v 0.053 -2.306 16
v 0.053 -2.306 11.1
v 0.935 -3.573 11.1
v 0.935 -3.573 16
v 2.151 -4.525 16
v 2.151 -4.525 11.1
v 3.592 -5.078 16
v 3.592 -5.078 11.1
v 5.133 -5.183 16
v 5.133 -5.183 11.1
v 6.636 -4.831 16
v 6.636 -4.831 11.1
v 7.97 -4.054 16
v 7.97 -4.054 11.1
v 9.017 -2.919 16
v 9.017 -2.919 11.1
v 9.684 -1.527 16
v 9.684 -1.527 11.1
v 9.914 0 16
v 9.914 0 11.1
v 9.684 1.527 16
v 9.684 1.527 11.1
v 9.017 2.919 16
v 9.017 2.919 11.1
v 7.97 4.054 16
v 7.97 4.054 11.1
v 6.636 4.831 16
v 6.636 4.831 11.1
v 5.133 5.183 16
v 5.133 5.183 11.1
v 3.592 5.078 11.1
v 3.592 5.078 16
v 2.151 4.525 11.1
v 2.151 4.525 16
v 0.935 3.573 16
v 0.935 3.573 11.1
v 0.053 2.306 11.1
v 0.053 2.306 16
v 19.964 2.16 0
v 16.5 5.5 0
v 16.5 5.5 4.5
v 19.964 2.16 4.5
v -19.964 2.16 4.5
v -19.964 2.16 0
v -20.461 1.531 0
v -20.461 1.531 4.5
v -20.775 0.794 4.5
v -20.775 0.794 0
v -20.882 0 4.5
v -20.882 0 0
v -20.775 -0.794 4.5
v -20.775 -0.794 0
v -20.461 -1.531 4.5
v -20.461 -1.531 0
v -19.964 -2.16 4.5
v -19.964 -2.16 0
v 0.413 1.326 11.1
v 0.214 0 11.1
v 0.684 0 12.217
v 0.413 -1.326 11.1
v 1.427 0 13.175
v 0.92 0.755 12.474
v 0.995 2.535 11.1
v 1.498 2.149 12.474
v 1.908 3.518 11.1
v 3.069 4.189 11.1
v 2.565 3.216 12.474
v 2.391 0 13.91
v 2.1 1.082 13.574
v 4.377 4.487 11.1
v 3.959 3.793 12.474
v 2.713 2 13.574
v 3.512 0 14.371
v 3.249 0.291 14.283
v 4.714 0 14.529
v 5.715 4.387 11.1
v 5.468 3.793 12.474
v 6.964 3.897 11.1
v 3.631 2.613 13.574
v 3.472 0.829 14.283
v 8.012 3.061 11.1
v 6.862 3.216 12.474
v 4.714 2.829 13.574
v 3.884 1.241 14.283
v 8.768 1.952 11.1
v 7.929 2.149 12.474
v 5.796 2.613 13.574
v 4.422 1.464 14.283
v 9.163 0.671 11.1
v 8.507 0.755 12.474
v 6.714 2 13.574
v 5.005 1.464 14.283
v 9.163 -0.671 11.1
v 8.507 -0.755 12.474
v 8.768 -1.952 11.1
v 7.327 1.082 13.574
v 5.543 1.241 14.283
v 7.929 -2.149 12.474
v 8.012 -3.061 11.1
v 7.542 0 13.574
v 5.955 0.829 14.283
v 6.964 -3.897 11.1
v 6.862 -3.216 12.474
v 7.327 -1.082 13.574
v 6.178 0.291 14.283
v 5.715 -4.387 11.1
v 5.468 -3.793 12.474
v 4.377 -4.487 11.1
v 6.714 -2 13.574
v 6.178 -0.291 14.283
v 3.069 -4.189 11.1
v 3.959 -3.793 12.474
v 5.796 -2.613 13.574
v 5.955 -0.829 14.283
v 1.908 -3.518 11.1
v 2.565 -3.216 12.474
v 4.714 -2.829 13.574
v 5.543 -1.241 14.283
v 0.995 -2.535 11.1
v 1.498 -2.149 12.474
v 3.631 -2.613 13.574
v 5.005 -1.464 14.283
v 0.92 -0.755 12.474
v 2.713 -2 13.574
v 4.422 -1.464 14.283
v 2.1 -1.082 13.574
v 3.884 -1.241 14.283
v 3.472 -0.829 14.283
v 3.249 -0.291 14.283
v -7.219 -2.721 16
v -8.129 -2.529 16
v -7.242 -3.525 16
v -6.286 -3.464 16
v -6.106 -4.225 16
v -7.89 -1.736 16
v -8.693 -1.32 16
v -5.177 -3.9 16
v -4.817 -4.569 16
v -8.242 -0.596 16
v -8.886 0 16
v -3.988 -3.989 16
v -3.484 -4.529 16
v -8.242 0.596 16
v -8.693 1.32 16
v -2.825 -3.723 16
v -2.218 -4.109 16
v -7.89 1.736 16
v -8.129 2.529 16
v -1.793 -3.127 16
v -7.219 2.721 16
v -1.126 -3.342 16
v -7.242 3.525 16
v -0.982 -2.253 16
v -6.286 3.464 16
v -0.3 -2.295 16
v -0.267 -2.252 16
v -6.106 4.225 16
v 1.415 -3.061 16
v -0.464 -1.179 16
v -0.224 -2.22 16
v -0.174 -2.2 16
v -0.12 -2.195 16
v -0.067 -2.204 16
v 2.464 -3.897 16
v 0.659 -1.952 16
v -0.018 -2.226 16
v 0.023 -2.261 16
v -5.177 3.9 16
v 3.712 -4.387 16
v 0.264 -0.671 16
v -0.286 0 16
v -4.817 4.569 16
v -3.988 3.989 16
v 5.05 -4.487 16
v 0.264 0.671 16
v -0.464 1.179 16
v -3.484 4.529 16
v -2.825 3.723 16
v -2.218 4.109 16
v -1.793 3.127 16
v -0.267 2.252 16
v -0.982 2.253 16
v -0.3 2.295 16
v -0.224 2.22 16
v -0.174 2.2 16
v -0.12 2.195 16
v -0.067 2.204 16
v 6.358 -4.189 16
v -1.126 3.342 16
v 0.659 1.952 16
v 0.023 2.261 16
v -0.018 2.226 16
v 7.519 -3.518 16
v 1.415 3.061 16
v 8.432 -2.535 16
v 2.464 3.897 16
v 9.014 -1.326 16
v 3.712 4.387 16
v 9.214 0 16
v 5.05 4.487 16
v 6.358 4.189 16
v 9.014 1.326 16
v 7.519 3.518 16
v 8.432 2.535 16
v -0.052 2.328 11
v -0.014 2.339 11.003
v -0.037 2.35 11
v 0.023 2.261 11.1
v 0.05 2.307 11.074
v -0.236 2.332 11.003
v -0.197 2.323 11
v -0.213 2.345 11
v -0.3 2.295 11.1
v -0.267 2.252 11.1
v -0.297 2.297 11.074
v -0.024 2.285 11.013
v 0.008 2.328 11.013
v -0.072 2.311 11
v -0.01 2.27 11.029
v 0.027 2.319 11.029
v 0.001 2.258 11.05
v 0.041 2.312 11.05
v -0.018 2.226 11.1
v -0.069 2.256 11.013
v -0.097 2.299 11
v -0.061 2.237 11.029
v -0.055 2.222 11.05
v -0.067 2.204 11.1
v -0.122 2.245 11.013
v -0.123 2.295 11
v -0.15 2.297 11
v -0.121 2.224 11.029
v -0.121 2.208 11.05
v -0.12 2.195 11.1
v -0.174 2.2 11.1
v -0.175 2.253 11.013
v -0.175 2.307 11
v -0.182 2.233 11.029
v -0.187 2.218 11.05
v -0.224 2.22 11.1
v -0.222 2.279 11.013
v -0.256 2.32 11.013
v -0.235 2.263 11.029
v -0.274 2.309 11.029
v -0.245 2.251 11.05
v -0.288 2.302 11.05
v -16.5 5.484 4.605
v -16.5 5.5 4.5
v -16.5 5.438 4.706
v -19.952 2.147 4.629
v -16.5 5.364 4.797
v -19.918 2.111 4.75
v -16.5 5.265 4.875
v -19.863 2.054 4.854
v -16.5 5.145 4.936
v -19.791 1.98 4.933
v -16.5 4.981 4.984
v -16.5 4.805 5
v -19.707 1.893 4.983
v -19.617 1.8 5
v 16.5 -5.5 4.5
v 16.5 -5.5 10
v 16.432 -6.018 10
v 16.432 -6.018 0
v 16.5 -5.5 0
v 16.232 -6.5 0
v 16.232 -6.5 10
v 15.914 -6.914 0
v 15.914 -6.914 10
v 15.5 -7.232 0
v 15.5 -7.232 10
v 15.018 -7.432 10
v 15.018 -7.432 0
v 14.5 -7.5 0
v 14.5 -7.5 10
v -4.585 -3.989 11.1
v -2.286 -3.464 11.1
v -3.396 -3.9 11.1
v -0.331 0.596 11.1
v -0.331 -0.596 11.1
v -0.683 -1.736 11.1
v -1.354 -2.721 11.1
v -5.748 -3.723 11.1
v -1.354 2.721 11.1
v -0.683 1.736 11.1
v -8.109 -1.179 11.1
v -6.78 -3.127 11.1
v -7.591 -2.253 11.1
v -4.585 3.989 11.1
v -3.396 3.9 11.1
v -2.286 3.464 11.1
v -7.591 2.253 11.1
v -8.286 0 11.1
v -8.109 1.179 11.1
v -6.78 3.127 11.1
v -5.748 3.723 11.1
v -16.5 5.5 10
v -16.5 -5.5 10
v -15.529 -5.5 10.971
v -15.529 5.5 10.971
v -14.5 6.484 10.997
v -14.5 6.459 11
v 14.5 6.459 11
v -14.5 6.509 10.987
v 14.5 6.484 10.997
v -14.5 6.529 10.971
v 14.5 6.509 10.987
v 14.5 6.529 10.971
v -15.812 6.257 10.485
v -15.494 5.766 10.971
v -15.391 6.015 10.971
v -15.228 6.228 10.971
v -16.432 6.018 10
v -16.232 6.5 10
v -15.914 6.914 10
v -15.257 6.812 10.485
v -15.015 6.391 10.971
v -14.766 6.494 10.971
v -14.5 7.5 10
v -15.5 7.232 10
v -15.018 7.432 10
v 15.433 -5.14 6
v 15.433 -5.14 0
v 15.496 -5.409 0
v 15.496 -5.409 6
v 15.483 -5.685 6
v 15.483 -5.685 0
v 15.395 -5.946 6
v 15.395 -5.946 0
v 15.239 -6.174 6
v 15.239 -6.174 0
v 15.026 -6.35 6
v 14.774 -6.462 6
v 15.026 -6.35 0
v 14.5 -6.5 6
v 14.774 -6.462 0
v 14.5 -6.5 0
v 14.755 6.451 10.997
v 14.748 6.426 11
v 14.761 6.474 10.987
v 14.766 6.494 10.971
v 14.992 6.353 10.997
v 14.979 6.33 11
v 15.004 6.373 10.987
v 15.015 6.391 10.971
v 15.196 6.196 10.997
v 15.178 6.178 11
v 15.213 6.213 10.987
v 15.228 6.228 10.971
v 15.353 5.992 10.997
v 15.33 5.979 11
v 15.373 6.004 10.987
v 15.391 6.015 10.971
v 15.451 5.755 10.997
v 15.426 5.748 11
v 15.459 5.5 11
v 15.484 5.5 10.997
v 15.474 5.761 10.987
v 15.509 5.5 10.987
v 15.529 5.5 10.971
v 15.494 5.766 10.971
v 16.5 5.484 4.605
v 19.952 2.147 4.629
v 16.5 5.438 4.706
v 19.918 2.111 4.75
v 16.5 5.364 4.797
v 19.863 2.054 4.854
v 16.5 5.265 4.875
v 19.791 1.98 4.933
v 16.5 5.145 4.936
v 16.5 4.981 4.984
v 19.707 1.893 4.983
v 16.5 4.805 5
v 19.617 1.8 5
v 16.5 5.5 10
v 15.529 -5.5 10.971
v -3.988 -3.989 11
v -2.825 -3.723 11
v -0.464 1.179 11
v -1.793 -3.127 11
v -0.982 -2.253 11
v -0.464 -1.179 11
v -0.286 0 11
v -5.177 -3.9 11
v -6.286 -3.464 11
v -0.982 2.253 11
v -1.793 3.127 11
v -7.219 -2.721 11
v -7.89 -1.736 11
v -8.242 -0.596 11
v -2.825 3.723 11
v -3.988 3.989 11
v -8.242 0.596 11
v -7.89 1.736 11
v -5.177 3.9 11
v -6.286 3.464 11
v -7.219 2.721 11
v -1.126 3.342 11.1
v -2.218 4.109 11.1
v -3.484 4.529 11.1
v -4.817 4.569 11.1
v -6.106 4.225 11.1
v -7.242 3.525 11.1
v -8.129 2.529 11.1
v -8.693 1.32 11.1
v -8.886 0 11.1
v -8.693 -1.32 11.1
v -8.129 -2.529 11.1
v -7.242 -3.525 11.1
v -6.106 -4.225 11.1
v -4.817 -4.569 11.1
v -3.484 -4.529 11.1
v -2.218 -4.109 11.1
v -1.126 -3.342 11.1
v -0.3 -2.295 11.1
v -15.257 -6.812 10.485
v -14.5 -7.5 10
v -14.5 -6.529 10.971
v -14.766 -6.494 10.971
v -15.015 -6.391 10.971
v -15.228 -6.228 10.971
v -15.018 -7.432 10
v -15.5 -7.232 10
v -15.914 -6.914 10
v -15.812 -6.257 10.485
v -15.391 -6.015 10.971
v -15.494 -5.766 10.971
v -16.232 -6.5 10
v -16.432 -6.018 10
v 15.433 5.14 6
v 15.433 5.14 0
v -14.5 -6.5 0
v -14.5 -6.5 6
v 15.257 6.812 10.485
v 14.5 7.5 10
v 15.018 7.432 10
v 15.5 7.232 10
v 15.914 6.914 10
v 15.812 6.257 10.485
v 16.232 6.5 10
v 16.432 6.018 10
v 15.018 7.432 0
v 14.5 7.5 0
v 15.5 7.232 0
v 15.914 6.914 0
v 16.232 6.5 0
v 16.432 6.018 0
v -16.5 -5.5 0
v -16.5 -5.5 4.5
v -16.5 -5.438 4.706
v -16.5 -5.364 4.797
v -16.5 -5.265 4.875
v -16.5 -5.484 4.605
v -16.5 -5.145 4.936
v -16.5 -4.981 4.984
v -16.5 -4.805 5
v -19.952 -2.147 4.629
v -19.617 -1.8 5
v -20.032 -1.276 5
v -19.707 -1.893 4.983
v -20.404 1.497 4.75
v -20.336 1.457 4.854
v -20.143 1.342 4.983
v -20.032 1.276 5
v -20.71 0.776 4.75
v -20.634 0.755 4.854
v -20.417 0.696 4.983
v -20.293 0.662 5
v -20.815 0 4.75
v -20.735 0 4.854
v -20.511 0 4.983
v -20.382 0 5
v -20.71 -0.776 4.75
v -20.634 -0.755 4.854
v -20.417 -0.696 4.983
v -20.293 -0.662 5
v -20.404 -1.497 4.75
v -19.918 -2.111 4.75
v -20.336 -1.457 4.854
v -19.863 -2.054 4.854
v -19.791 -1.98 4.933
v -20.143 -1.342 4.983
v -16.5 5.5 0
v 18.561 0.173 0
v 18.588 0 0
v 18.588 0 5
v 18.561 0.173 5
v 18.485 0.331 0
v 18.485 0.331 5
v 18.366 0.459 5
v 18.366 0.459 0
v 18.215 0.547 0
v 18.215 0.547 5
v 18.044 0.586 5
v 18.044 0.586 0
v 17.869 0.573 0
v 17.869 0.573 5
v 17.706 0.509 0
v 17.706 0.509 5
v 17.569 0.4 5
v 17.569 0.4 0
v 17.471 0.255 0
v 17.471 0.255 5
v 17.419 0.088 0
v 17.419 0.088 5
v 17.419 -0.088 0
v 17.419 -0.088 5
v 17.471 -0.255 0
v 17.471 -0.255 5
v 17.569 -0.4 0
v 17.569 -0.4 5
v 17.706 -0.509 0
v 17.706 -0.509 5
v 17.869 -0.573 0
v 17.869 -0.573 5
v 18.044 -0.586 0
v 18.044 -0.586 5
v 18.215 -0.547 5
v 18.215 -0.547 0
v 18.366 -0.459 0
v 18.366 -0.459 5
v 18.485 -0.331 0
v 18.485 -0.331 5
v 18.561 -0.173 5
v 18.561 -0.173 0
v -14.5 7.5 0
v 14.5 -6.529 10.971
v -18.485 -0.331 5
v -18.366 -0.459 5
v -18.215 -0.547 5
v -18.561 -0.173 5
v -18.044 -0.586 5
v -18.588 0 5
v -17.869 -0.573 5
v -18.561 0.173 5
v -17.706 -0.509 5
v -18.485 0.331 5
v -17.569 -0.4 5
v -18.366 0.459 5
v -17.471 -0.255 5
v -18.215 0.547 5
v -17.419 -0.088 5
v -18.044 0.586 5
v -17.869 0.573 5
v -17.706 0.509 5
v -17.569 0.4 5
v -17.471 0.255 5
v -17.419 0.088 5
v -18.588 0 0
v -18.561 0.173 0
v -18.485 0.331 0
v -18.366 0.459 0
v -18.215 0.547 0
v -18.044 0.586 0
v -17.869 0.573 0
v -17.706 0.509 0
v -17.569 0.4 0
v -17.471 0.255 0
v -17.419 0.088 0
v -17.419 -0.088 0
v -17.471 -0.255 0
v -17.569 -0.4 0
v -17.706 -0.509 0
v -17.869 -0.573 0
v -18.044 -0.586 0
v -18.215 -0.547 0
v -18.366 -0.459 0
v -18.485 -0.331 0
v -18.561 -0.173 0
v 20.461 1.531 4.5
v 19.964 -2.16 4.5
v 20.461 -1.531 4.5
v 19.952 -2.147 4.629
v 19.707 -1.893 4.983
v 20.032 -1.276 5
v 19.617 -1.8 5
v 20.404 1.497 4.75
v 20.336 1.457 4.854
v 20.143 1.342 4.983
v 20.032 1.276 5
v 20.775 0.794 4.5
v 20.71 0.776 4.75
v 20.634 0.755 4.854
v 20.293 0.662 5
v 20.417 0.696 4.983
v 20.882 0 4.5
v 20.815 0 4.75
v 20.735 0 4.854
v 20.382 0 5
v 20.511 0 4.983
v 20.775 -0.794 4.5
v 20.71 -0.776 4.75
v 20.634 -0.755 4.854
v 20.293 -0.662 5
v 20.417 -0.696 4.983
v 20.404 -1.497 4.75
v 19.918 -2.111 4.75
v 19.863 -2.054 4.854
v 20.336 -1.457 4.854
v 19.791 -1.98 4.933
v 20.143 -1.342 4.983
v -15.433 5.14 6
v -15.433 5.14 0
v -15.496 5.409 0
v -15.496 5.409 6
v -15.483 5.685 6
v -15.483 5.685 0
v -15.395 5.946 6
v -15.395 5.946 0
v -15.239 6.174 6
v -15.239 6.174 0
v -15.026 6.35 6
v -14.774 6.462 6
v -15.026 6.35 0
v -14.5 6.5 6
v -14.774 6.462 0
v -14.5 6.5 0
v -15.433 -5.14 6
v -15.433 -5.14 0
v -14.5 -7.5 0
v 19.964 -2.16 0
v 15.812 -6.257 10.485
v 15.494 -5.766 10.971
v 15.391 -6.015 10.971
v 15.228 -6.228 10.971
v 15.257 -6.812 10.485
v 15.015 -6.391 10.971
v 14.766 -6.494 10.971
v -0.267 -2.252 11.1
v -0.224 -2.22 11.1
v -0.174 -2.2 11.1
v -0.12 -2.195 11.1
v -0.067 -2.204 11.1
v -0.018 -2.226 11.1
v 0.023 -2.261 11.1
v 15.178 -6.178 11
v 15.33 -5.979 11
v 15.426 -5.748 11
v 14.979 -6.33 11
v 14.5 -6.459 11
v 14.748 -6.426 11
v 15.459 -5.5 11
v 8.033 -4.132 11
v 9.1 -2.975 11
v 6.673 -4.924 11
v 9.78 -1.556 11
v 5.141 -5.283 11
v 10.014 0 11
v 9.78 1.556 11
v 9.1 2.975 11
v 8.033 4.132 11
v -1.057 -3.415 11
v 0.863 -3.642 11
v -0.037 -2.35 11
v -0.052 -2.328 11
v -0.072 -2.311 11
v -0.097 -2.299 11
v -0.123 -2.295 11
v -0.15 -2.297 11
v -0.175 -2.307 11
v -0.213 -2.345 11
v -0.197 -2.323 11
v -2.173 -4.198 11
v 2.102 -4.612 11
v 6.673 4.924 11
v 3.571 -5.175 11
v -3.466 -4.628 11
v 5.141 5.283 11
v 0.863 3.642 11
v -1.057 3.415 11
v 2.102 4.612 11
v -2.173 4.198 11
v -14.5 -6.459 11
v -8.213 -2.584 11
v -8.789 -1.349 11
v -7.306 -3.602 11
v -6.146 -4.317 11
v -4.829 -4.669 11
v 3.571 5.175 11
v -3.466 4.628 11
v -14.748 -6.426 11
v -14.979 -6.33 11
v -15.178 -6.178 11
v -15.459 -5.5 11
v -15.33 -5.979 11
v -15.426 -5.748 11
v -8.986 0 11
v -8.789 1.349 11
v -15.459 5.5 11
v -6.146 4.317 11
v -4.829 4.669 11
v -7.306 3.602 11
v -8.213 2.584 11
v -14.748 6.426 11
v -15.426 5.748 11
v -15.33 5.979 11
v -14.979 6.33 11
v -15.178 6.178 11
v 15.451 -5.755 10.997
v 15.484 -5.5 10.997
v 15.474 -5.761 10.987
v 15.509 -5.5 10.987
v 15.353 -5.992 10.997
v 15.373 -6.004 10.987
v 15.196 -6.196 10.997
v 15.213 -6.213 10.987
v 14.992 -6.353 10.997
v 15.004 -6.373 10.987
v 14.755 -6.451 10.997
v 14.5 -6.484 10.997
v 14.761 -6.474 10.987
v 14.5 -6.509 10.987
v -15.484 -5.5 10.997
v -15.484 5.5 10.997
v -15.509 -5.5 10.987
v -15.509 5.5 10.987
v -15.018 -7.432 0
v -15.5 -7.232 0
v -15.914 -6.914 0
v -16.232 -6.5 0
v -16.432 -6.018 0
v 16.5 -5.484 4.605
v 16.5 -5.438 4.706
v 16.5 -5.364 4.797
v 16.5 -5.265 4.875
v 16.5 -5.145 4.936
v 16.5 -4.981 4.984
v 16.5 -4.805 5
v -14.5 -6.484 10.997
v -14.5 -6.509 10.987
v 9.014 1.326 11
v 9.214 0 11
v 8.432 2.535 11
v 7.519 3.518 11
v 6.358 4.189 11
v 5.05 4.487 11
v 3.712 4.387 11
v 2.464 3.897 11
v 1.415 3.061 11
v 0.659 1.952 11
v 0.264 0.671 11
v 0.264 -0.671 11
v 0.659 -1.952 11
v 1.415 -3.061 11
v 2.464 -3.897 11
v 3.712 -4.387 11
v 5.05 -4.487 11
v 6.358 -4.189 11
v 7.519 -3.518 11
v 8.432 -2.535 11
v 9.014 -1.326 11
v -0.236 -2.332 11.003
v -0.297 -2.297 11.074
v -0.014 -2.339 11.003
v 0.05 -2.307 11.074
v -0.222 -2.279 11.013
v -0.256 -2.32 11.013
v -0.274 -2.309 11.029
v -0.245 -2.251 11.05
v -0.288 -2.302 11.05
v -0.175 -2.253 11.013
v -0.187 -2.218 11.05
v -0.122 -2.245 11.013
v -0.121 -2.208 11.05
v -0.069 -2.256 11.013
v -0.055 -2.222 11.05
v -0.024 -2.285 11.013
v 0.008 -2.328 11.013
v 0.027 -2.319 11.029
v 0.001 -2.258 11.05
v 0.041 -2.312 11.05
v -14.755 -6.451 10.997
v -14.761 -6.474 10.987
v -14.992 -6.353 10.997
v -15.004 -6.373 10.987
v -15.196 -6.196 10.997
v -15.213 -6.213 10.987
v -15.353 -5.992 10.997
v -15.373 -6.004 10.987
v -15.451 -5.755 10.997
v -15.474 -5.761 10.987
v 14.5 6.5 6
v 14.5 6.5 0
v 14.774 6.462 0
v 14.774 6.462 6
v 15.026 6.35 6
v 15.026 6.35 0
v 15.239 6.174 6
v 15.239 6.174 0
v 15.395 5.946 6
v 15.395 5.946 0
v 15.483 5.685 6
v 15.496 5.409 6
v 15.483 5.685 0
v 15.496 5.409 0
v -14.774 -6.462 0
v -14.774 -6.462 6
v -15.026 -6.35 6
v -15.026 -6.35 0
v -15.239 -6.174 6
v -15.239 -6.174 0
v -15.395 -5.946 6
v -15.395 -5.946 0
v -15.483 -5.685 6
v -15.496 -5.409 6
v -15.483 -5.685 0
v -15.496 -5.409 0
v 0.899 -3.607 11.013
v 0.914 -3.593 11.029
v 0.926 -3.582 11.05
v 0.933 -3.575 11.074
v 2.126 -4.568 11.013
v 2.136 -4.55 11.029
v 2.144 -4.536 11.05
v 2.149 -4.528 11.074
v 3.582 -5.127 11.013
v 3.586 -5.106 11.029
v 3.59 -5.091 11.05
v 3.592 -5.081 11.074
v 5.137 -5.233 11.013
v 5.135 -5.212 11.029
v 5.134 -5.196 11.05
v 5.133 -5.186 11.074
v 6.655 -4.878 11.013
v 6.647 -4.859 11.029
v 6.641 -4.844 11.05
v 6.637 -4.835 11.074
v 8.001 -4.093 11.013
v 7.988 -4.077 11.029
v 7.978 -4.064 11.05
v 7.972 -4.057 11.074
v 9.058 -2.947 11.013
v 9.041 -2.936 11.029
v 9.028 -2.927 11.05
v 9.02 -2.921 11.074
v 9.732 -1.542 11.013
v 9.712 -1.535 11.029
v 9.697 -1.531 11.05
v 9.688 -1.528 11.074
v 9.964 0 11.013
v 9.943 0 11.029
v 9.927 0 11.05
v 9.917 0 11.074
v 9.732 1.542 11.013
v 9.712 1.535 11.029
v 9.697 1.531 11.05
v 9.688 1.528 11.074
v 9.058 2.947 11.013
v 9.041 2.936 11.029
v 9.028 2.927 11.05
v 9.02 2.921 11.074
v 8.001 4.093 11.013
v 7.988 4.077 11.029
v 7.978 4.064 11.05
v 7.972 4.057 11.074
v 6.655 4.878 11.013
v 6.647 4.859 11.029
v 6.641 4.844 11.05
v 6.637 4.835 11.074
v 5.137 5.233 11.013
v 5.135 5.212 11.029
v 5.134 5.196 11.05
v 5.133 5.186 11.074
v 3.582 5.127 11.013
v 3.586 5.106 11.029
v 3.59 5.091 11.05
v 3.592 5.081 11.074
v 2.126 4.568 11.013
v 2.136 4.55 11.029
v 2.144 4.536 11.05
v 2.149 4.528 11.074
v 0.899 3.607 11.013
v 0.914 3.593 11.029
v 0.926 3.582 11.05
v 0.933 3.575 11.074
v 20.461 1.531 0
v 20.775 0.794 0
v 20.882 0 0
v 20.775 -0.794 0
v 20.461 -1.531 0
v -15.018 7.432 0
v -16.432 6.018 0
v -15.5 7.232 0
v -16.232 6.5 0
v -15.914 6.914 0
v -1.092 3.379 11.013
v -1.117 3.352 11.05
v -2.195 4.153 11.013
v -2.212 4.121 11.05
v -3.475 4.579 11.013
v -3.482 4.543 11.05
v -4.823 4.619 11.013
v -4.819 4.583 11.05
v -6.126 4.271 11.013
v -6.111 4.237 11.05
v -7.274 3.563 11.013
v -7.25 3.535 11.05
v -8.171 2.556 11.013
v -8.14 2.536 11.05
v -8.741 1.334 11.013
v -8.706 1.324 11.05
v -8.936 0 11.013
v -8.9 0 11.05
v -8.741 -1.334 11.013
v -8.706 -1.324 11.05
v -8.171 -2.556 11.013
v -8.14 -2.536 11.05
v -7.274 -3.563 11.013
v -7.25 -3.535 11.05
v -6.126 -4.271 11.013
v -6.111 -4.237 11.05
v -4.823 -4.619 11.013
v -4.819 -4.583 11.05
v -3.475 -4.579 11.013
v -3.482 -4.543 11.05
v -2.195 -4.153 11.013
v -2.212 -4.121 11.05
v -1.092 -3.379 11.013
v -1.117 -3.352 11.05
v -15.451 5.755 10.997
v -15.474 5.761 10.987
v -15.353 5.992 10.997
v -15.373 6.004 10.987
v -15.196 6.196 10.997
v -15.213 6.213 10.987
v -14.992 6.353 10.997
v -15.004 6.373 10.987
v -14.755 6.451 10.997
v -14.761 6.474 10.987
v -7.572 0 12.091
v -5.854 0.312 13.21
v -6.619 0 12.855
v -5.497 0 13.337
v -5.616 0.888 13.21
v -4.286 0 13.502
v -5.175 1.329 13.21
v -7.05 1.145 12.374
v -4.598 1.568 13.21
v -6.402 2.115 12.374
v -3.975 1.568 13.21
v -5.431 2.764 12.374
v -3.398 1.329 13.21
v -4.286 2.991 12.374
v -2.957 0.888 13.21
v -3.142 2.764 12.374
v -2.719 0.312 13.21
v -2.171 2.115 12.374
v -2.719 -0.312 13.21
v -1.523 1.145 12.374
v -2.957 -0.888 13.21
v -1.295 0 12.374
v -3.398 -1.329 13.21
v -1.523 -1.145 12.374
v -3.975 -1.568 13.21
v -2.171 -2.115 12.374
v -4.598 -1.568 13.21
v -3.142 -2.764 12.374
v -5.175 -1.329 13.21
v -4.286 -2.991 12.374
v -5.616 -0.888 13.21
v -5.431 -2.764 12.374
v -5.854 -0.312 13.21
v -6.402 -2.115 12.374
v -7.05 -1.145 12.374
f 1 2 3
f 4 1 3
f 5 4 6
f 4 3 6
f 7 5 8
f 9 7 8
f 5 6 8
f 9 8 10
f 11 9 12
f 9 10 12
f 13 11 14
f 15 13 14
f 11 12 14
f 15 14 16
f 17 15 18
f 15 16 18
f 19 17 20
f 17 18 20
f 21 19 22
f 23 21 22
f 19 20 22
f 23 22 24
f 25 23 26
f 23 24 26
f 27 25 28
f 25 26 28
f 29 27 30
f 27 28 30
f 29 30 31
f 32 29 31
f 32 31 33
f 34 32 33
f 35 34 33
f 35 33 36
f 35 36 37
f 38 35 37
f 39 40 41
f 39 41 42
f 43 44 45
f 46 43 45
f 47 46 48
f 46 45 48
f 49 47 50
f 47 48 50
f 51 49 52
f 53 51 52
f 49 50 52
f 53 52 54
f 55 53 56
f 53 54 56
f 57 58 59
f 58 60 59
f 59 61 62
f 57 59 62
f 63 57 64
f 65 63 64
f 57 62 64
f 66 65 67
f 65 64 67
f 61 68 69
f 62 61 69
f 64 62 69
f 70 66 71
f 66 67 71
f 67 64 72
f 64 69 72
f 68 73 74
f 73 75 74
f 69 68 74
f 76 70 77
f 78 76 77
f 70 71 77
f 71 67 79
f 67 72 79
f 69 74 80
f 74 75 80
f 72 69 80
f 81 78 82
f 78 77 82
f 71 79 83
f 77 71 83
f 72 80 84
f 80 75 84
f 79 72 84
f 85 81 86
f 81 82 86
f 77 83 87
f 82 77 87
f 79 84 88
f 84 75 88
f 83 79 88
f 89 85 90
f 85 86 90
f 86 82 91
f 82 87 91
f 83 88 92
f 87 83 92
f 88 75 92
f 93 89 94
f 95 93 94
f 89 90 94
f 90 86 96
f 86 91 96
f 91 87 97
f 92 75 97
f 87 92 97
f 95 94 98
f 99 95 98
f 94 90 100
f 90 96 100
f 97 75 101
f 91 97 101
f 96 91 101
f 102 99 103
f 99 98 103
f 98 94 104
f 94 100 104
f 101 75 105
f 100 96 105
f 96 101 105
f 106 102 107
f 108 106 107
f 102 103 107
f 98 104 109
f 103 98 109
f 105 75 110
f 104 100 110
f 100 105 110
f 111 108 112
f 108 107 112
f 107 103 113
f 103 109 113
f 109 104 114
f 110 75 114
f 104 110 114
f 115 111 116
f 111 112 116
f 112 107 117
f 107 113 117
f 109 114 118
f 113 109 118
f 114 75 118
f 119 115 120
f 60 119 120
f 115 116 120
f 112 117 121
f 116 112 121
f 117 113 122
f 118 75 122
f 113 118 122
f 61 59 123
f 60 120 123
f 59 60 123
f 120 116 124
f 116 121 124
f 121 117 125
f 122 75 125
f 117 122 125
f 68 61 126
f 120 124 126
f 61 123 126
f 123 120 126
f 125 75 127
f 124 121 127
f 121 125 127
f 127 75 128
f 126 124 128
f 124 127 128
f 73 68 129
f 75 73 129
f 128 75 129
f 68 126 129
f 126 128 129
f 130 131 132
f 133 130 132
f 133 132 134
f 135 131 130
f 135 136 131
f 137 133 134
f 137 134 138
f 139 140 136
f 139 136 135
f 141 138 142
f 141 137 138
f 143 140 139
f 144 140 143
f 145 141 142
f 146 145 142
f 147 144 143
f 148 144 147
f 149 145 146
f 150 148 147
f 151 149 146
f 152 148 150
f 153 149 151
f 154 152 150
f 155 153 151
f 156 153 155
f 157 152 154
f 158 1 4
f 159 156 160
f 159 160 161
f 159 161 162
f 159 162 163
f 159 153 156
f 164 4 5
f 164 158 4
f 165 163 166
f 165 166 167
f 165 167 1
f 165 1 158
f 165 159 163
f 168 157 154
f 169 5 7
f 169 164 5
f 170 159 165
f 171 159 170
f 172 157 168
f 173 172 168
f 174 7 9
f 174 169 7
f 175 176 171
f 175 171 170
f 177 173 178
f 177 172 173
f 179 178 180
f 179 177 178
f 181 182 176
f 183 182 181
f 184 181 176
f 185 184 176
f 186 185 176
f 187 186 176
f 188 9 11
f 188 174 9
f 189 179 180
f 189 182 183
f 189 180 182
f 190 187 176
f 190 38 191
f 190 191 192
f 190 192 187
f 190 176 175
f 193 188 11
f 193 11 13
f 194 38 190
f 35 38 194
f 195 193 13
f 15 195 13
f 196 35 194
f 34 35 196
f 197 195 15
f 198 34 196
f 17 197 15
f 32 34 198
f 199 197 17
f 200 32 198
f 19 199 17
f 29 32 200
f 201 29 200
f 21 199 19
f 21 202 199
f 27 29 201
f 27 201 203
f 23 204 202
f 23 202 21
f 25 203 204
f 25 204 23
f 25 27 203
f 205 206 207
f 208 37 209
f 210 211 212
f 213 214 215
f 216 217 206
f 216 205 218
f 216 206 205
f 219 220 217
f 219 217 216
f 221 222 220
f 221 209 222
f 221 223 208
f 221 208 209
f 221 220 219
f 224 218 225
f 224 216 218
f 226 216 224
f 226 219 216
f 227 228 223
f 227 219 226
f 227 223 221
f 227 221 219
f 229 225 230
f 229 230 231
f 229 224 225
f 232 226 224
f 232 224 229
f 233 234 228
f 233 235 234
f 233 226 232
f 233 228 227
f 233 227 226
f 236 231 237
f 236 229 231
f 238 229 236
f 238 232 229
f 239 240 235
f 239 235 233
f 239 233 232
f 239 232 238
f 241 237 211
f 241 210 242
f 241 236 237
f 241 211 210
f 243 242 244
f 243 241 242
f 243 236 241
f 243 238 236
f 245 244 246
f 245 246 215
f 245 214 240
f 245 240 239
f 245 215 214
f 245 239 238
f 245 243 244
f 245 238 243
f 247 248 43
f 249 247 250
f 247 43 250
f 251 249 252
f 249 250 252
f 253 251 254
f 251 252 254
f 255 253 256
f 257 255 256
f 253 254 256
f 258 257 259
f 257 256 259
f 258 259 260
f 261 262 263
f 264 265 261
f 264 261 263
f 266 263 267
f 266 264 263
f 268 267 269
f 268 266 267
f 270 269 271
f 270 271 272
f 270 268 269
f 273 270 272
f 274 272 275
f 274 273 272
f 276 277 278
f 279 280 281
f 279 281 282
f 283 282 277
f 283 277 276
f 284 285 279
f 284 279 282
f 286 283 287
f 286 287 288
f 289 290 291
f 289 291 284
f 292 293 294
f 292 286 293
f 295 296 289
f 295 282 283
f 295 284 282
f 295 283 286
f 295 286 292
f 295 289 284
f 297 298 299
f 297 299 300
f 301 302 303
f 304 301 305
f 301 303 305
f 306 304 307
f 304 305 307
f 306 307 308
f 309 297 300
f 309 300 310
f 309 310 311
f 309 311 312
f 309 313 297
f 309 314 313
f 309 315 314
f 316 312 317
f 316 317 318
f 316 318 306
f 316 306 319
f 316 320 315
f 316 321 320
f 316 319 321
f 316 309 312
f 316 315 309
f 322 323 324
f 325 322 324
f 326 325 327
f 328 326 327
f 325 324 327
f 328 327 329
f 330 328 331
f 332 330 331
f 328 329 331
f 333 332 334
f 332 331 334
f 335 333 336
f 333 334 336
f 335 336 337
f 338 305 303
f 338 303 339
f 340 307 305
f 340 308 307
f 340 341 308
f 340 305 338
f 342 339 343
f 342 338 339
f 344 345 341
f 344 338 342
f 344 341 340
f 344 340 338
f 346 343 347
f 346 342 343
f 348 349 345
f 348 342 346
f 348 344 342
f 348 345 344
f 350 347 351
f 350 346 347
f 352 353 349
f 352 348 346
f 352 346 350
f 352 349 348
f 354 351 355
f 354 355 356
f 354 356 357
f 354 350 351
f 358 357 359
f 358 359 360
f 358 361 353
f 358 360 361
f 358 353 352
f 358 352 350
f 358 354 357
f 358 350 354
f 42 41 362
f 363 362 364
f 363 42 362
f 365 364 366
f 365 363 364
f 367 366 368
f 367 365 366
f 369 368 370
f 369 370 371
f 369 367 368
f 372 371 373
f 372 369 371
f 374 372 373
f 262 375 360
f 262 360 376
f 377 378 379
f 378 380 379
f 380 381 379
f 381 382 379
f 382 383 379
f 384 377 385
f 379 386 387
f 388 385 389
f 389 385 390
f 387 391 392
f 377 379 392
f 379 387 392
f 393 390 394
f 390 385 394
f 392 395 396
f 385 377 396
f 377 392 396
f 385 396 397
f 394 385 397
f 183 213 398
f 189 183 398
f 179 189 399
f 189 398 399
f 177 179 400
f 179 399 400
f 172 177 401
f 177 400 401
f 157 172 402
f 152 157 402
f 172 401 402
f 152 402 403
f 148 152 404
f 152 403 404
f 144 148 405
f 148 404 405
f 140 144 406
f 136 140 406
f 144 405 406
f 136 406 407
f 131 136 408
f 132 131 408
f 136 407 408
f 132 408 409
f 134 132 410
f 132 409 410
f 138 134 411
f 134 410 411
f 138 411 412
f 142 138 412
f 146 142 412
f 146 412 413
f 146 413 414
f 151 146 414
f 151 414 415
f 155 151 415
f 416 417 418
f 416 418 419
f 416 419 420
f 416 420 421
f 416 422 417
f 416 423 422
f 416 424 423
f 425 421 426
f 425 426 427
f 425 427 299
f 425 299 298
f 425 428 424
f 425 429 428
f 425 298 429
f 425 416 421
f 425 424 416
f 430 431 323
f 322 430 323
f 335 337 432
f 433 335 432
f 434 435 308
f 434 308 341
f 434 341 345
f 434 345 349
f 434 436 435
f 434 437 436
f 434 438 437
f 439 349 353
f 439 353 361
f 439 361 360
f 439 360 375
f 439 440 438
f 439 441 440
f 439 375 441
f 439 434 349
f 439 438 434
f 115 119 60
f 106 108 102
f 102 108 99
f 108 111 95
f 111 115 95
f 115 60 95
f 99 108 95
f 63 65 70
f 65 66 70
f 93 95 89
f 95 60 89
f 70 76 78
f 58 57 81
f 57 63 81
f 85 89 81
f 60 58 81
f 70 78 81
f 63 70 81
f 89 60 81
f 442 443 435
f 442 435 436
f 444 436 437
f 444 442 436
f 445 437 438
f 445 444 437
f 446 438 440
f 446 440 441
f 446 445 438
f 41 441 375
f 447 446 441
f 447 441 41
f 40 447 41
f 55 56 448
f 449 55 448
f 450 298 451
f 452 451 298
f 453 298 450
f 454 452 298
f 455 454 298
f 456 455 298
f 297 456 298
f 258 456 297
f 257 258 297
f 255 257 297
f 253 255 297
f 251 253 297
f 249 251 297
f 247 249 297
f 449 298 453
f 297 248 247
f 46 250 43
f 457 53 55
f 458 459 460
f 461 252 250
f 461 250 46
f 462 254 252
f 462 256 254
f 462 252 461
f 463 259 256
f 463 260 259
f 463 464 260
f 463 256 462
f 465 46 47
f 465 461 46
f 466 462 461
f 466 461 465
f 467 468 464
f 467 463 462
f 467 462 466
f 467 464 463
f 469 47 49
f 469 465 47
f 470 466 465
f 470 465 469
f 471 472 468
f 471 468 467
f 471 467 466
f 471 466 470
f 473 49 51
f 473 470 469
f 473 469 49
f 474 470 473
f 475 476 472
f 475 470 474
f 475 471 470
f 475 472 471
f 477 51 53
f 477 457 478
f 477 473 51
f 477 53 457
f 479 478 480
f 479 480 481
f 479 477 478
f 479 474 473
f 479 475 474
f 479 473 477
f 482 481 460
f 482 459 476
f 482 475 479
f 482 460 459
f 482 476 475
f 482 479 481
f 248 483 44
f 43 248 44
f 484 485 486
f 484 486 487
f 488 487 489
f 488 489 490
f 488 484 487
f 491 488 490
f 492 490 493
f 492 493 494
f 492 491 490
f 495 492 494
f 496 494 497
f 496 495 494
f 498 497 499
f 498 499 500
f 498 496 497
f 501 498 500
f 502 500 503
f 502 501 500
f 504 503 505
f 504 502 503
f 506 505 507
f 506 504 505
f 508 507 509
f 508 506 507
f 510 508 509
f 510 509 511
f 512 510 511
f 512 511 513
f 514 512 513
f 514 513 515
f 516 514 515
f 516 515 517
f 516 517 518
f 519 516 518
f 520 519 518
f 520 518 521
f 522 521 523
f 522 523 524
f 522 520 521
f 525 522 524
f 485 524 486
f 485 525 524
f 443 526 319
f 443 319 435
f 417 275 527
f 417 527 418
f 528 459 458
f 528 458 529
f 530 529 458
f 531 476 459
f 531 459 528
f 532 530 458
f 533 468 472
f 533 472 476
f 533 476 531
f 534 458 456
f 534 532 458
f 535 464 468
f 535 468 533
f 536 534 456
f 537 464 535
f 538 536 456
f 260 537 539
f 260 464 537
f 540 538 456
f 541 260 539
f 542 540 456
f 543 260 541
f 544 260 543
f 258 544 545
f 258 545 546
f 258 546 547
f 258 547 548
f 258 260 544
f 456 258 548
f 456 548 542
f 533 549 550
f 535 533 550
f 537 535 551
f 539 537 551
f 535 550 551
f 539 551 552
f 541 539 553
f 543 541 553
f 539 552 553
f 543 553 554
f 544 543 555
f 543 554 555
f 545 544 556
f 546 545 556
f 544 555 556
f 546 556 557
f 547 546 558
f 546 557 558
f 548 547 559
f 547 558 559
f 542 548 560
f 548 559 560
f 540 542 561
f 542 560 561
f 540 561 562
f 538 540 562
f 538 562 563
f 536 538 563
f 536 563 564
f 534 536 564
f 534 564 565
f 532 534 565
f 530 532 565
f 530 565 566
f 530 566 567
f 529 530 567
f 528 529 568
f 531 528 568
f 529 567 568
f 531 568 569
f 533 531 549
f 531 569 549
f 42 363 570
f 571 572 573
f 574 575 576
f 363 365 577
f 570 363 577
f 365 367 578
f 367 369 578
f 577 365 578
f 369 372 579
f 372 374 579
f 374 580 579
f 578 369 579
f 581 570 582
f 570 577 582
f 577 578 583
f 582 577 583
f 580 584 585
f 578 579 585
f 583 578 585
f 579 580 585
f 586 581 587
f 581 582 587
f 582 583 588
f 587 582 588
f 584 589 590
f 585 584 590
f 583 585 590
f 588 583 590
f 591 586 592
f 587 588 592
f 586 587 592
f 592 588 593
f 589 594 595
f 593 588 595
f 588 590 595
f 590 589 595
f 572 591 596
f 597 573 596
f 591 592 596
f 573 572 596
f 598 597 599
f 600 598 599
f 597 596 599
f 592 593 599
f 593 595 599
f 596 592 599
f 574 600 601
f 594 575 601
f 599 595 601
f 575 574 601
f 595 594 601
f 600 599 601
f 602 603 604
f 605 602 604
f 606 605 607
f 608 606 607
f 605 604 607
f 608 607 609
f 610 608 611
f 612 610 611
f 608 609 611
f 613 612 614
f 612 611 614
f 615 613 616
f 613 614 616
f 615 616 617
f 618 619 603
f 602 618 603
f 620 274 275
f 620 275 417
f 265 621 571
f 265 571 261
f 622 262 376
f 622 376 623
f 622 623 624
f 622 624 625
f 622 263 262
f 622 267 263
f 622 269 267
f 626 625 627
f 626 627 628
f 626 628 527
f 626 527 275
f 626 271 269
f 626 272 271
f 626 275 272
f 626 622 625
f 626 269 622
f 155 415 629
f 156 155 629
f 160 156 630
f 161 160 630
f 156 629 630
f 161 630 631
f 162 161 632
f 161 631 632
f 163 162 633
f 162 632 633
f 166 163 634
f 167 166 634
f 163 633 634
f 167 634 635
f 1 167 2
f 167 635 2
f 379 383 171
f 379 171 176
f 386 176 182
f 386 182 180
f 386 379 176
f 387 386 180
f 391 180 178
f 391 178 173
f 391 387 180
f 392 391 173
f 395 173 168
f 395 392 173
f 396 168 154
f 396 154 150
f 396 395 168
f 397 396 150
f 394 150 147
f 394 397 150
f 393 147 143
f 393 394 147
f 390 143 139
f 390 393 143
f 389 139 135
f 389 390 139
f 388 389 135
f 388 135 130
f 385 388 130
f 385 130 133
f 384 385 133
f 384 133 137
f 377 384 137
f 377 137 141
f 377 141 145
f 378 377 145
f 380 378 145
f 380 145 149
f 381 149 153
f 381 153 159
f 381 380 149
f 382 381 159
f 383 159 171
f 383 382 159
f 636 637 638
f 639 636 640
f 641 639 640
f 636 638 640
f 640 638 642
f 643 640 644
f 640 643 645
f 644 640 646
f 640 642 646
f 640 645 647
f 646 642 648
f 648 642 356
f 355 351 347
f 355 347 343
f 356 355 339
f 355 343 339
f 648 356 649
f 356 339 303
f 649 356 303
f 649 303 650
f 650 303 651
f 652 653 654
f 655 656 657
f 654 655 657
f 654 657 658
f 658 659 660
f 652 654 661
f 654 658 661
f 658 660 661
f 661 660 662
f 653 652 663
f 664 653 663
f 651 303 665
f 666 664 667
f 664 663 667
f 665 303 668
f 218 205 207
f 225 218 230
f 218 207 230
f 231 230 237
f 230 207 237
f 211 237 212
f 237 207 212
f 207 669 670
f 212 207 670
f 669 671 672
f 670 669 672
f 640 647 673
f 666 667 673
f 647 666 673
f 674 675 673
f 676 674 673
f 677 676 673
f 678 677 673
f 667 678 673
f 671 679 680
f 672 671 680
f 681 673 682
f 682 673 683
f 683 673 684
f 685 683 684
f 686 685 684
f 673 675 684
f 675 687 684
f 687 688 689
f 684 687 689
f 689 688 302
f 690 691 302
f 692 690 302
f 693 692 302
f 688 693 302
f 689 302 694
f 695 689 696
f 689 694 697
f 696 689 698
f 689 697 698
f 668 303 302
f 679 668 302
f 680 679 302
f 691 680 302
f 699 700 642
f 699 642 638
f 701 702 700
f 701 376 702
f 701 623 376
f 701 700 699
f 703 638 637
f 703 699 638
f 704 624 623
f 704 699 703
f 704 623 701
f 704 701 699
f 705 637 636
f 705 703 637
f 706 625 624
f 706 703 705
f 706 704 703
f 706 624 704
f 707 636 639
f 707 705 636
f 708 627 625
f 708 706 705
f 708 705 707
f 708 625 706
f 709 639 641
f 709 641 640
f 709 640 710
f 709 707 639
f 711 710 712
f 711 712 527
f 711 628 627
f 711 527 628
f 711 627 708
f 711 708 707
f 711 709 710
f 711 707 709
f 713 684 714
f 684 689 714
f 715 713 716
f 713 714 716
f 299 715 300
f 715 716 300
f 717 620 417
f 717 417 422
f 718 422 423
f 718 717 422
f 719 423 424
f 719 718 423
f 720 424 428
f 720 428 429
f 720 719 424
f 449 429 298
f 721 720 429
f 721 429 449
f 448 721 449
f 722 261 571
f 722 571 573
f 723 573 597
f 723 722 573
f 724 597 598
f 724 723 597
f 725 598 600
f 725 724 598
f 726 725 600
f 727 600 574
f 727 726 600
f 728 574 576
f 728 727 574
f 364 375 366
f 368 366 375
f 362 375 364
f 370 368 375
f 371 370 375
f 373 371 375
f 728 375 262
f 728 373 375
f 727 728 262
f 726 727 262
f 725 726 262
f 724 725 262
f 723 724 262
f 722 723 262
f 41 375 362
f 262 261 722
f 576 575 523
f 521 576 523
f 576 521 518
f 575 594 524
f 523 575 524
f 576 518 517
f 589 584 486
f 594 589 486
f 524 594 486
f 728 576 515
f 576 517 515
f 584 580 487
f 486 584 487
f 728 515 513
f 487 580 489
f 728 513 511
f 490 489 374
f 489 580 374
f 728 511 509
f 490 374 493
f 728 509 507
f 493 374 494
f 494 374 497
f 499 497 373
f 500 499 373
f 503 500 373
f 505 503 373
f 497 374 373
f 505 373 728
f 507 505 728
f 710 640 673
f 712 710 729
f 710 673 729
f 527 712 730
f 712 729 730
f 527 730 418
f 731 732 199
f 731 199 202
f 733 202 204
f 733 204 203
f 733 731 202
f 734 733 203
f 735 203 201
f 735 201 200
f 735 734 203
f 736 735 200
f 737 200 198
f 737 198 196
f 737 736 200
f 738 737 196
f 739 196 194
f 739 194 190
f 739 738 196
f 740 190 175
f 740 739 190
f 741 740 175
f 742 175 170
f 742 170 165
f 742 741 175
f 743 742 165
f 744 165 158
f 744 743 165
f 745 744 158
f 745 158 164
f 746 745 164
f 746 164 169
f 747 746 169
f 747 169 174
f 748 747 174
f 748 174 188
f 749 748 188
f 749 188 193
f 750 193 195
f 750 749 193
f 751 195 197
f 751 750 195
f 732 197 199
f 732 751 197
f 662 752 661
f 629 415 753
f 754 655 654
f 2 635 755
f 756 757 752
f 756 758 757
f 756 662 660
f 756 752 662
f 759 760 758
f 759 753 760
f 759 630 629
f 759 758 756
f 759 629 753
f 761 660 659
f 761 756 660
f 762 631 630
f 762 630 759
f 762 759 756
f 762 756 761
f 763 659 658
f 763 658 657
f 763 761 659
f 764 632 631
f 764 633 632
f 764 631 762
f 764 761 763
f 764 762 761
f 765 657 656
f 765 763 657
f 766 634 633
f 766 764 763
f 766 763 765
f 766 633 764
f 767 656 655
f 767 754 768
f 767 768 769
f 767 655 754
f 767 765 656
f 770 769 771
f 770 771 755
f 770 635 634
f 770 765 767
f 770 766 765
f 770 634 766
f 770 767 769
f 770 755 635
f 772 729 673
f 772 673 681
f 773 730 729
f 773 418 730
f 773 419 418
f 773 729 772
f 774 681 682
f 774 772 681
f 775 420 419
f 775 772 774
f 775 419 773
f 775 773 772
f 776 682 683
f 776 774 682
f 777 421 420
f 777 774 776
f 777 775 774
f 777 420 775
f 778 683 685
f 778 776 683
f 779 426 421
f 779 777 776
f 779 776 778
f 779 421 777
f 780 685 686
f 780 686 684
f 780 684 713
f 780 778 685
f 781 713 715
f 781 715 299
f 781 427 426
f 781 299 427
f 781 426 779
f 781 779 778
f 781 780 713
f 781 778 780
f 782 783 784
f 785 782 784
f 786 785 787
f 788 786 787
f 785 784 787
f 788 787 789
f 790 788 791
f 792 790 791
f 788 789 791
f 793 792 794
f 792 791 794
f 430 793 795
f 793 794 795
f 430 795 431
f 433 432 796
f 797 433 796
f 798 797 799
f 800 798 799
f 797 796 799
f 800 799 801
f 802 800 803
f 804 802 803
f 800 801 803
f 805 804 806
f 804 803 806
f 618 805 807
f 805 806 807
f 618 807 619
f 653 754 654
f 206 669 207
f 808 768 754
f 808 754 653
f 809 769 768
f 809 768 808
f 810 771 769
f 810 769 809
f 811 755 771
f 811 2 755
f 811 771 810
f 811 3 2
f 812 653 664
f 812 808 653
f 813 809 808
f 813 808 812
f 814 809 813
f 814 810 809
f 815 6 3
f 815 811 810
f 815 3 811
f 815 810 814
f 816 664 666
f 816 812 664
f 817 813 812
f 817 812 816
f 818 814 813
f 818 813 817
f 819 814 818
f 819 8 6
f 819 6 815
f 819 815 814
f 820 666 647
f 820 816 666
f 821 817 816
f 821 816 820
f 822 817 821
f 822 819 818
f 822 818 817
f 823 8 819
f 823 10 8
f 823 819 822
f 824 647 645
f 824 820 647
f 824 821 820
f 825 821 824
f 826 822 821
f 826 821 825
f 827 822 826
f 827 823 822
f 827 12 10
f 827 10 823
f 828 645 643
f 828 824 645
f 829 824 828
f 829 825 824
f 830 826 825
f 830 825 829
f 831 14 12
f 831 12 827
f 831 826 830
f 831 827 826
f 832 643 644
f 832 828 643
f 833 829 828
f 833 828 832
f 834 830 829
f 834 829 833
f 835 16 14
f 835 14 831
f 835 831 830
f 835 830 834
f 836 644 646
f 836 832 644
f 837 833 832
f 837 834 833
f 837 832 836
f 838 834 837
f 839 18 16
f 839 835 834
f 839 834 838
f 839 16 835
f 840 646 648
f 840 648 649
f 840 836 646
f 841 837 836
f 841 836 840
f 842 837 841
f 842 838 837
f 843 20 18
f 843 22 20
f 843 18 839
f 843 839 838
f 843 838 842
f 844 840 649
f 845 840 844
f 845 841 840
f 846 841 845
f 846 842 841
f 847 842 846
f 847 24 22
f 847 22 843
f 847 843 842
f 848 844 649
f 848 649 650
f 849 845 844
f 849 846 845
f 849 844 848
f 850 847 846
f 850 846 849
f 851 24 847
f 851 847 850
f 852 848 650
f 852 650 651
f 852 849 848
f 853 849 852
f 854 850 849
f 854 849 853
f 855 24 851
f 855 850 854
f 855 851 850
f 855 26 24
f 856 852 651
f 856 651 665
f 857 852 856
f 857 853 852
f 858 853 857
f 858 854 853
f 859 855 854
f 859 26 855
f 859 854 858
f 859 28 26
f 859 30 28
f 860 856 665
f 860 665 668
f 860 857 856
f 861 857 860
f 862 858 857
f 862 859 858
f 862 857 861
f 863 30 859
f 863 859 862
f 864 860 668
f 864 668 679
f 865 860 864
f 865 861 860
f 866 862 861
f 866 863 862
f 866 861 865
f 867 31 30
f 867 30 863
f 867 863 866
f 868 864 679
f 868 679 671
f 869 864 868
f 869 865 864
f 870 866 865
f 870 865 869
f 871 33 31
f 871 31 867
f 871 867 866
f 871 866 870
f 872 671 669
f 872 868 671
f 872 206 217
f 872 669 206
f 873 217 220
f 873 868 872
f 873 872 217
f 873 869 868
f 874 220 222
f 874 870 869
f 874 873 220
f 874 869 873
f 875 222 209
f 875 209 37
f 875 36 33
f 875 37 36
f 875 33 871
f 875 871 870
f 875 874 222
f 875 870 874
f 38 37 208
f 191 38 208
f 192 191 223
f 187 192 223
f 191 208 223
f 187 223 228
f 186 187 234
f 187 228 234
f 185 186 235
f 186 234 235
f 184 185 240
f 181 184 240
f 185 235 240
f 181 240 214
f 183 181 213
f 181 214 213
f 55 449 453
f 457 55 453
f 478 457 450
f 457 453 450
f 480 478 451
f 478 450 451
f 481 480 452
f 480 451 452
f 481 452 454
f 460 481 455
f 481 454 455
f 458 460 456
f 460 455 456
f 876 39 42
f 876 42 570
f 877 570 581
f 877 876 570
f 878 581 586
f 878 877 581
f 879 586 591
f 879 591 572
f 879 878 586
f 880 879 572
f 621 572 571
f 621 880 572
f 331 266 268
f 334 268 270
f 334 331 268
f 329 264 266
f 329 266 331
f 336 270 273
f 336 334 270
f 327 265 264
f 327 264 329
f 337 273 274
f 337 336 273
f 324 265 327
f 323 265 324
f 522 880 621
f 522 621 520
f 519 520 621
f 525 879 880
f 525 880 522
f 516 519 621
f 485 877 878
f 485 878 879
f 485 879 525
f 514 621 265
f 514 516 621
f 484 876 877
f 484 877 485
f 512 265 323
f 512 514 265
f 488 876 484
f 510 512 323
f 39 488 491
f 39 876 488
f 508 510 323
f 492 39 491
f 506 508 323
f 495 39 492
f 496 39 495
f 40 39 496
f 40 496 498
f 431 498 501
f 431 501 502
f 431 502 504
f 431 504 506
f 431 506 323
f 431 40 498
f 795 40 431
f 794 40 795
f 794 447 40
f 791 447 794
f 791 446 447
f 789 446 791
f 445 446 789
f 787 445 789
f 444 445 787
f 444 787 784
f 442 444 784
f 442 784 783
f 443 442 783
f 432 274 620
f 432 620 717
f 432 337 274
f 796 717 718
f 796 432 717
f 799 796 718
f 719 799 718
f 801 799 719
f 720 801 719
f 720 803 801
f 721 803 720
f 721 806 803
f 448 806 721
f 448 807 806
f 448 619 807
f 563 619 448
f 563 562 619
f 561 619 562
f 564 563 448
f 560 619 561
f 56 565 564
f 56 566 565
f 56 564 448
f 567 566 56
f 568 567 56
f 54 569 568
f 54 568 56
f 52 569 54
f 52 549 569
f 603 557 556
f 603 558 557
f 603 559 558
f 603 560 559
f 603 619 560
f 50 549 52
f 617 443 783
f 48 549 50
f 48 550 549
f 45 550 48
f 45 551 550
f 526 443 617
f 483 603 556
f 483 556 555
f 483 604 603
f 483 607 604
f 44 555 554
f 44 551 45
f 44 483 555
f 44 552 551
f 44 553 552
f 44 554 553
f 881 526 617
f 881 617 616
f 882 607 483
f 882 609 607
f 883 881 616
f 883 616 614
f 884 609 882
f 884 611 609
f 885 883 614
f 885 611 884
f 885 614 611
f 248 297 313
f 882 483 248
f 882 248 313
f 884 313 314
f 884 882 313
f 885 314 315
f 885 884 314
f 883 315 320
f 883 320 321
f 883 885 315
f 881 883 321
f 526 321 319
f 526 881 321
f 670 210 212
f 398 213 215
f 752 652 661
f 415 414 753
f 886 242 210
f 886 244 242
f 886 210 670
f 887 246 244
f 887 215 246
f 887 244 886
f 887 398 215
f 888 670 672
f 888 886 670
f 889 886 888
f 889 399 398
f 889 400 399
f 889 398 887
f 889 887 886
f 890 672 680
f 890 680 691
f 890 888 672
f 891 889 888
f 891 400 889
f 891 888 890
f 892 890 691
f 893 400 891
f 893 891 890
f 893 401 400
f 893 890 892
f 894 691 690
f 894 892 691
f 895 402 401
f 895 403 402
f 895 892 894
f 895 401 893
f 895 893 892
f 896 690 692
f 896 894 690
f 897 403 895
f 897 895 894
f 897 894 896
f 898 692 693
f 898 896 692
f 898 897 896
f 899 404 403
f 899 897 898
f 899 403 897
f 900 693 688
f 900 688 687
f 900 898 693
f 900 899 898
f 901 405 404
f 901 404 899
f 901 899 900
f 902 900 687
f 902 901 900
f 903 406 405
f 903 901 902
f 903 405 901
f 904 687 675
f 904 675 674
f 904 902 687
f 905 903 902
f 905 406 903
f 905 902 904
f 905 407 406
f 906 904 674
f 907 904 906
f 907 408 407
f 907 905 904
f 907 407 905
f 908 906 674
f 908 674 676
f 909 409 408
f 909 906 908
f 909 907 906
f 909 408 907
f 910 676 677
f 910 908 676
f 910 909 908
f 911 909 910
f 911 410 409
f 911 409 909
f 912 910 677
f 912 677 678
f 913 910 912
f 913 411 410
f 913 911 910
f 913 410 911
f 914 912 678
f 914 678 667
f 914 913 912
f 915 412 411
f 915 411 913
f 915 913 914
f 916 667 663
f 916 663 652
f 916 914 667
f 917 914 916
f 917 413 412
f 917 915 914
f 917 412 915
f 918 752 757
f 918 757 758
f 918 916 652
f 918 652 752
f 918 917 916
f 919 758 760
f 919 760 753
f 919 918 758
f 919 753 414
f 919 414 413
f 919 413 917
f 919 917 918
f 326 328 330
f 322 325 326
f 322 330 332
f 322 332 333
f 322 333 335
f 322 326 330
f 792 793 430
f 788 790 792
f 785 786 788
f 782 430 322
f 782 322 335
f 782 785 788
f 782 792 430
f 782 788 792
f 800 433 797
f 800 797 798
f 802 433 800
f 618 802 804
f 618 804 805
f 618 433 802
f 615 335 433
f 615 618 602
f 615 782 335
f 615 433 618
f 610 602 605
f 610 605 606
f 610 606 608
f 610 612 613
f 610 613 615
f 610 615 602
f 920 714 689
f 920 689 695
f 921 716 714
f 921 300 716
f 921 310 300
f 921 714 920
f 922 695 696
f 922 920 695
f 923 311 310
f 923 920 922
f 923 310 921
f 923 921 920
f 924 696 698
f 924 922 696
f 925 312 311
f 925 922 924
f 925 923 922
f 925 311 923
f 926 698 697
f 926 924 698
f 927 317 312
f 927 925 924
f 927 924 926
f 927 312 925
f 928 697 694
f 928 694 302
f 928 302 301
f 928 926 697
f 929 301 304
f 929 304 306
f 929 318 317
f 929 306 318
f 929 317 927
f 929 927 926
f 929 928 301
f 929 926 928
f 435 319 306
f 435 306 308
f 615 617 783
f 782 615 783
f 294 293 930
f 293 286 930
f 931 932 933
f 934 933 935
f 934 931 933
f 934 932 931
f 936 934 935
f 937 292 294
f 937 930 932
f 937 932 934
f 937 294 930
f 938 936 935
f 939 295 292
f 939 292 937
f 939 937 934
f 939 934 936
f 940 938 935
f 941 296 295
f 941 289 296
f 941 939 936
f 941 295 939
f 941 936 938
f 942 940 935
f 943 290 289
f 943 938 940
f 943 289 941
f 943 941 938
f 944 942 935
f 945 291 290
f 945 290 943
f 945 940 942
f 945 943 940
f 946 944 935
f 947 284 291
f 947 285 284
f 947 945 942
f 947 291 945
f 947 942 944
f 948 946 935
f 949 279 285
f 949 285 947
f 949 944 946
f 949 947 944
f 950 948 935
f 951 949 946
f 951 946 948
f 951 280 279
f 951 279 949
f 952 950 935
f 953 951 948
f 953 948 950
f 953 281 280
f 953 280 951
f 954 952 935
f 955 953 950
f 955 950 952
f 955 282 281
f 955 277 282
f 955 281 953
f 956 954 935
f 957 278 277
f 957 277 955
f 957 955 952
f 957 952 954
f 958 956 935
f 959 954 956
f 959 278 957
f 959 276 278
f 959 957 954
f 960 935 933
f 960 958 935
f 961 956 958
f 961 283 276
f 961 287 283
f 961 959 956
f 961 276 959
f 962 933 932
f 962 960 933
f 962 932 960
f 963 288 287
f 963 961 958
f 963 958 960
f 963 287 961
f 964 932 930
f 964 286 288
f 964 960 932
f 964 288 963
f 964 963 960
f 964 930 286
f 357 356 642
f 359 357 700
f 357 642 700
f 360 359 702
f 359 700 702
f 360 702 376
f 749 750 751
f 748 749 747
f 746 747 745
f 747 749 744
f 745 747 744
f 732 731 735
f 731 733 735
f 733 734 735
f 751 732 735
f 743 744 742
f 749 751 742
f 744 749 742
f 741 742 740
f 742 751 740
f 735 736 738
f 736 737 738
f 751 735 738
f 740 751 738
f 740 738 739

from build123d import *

# Parameters (mm, degrees)
BOSS_EXTRU_1_DEPTH      = 11
ESQUISSE2_R             = 0.5875
BOSS_EXTRU_2_DEPTH      = 5
ESQUISSE3_R             = 4.5
ESQUISSE3_R_2           = 4
BOSS_EXTRU_3_DEPTH      = 5
CHANFREIN1_SIZE         = 1
CONG_3_R                = 0.5
CONG_4_R                = 0.1
ENL_V_MAT_EXTRU_1_DEPTH = 6


with BuildPart() as part:
    # Esquisse1 → Boss.-Extru.1 (new body)
    with BuildSketch(Plane.XY):
        with BuildLine():
            Line((-14.5, 7.5), (14.5, 7.5))
            ThreePointArc((14.5, 7.5), (15.914213562, 6.914213562), (16.5, 5.5))
            Line((16.5, 5.5), (16.5, -5.5))
            ThreePointArc((16.5, -5.5), (15.914213562, -6.914213562), (14.5, -7.5))
            Line((14.5, -7.5), (-14.5, -7.5))
            ThreePointArc((-14.5, -7.5), (-15.914213562, -6.914213562), (-16.5, -5.5))
            Line((-16.5, -5.5), (-16.5, 5.5))
            ThreePointArc((-16.5, 5.5), (-15.914213562, 6.914213562), (-14.5, 7.5))
        make_face()
    extrude(amount=BOSS_EXTRU_1_DEPTH)

    # Esquisse2 → Boss.-Extru.2 (add)
    with BuildSketch(Plane(origin=(0, 0, 0), x_dir=(-1, 0, 0), z_dir=(0, 0, -1))):
        with BuildLine():
            Line((16.5, 5.5), (19.964184984, 2.159531519))
            ThreePointArc((19.964184984, 2.159531519), (20.881776854, 0), (19.964184984, -2.159531519))
            Line((19.964184984, -2.159531519), (16.5, -5.5))
            Line((16.5, -5.5), (16.5, 5.5))
        make_face()
        with Locations((18, 0)):
            Circle(ESQUISSE2_R, mode=Mode.SUBTRACT)
    boss_extru_2 = extrude(amount=-BOSS_EXTRU_2_DEPTH)

    # Symétrie1: Boss.-Extru.2 across plane
    add(boss_extru_2.mirror(Plane(origin=(0, 0, 0), x_dir=(0, 0, 1), z_dir=(1, 0, 0))))

    # Esquisse3 → Boss.-Extru.3 (add)
    with BuildSketch(Plane.XY.offset(11)):
        with BuildLine():
            ThreePointArc((-0.299832182, 2.294883197), (-8.886498849, 0), (-0.299832182, -2.294883197))
            ThreePointArc((-0.299832182, -2.294883197), (-0.120213455, -2.194759517), (0.05276041, -2.305969589))
            ThreePointArc((0.05276041, -2.305969589), (9.913501151, 0), (0.05276041, 2.305969589))
            ThreePointArc((0.05276041, 2.305969589), (-0.120213455, 2.194759517), (-0.299832182, 2.294883197))
        make_face()
        with Locations((4.713501151, 0)):
            Circle(ESQUISSE3_R, mode=Mode.SUBTRACT)
        with Locations((-4.286498849, 0)):
            Circle(ESQUISSE3_R_2, mode=Mode.SUBTRACT)
    extrude(amount=BOSS_EXTRU_3_DEPTH)

    # Chanfrein1
    chanfrein1_edges = [part.edges().sort_by_distance(p)[0] for p in [
        (15.914213562, -6.914213562, 11),
        (16.5, 0, 11),
        (15.914213562, 6.914213562, 11),
        (0, 7.5, 11),
        (-15.914213562, 6.914213562, 11),
        (-16.5, 0, 11),
        (-15.914213562, -6.914213562, 11),
        (0, -7.5, 11),
    ]]
    chamfer(chanfrein1_edges, length=CHANFREIN1_SIZE)

    # Congé3
    cong_3_edges = [part.edges().sort_by_distance(p)[0] for p in [
        (-18.232092492, 3.829765759, 5),
        (-20.881776854, 0, 5),
        (-18.232092492, -3.829765759, 5),
        (18.232092492, -3.829765759, 5),
        (20.881776854, 0, 5),
        (18.232092492, 3.829765759, 5),
    ]]
    fillet(cong_3_edges, radius=CONG_3_R)

    # Congé4
    cong_4_edges = [part.edges().sort_by_distance(p)[0] for p in [
        (-0.120213455, -2.194759517, 11),
        (9.913501151, 0, 11),
        (-0.120213455, 2.194759517, 11),
        (-8.886498849, 0, 11),
        (-15.5, 0, 11),
        (-15.207106781, -6.207106781, 11),
        (-15.207106781, 6.207106781, 11),
        (0, -6.5, 11),
        (0, 6.5, 11),
        (15.207106781, -6.207106781, 11),
        (15.207106781, 6.207106781, 11),
        (15.5, 0, 11),
    ]]
    fillet(cong_4_edges, radius=CONG_4_R)

    # Esquisse6 → Enlèv. mat.-Extru.1 (cut)
    with BuildSketch(Plane(origin=(0, 0, 0), x_dir=(-1, 0, 0), z_dir=(0, 0, -1))):
        with BuildLine():
            Line((-15.432881985, 5.13981782), (-15.432881985, -5.13981782))
            ThreePointArc((-15.432881985, -5.13981782), (-15.324676355, -6.065604906), (-14.5, -6.5))
            Line((-14.5, -6.5), (14.5, -6.5))
            ThreePointArc((14.5, -6.5), (15.324676355, -6.065604906), (15.432881985, -5.13981782))
            Line((15.432881985, -5.13981782), (15.432881985, 5.13981782))
            ThreePointArc((15.432881985, 5.13981782), (15.324676355, 6.065604906), (14.5, 6.5))
            Line((14.5, 6.5), (-14.5, 6.5))
            ThreePointArc((-14.5, 6.5), (-15.324676355, 6.065604906), (-15.432881985, 5.13981782))
        make_face()
    extrude(amount=-ENL_V_MAT_EXTRU_1_DEPTH, mode=Mode.SUBTRACT)


with BuildPart() as body_2:
    # Esquisse8 → Révolution2 (revolve)
    with BuildSketch(Plane(origin=(0, 0, 0), x_dir=(1, 0, 0), z_dir=(0, 1, 0))):
        with BuildLine():
            Line((4.713501151, -11.1), (0.213501151, -11.1))
            ThreePointArc((0.213501151, -11.1), (1.884860928, -13.573739635), (4.713501151, -14.528530595))
            Line((4.713501151, -14.528530595), (4.713501151, -11.1))
        make_face()
    revolve(axis=Axis((4.713501151, 0, 16), (0, 0, -1)))


with BuildPart() as body_3:
    # Esquisse9 → Révolution3 (revolve)
    with BuildSketch(Plane(origin=(0, 0, 0), x_dir=(1, 0, 0), z_dir=(0, 1, 0))):
        with BuildLine():
            Line((-8.286498849, -11.1), (-4.286498849, -11.1))
            Line((-4.286498849, -11.1), (-4.286498849, -13.501533111))
            ThreePointArc((-4.286498849, -13.501533111), (-6.619274089, -12.855037889), (-8.286498849, -11.1))
        make_face()
    revolve(axis=Axis((-4.286498849, 0, 16), (0, 0, -1)))


solid = Compound([part.part, body_2.part, body_3.part])
